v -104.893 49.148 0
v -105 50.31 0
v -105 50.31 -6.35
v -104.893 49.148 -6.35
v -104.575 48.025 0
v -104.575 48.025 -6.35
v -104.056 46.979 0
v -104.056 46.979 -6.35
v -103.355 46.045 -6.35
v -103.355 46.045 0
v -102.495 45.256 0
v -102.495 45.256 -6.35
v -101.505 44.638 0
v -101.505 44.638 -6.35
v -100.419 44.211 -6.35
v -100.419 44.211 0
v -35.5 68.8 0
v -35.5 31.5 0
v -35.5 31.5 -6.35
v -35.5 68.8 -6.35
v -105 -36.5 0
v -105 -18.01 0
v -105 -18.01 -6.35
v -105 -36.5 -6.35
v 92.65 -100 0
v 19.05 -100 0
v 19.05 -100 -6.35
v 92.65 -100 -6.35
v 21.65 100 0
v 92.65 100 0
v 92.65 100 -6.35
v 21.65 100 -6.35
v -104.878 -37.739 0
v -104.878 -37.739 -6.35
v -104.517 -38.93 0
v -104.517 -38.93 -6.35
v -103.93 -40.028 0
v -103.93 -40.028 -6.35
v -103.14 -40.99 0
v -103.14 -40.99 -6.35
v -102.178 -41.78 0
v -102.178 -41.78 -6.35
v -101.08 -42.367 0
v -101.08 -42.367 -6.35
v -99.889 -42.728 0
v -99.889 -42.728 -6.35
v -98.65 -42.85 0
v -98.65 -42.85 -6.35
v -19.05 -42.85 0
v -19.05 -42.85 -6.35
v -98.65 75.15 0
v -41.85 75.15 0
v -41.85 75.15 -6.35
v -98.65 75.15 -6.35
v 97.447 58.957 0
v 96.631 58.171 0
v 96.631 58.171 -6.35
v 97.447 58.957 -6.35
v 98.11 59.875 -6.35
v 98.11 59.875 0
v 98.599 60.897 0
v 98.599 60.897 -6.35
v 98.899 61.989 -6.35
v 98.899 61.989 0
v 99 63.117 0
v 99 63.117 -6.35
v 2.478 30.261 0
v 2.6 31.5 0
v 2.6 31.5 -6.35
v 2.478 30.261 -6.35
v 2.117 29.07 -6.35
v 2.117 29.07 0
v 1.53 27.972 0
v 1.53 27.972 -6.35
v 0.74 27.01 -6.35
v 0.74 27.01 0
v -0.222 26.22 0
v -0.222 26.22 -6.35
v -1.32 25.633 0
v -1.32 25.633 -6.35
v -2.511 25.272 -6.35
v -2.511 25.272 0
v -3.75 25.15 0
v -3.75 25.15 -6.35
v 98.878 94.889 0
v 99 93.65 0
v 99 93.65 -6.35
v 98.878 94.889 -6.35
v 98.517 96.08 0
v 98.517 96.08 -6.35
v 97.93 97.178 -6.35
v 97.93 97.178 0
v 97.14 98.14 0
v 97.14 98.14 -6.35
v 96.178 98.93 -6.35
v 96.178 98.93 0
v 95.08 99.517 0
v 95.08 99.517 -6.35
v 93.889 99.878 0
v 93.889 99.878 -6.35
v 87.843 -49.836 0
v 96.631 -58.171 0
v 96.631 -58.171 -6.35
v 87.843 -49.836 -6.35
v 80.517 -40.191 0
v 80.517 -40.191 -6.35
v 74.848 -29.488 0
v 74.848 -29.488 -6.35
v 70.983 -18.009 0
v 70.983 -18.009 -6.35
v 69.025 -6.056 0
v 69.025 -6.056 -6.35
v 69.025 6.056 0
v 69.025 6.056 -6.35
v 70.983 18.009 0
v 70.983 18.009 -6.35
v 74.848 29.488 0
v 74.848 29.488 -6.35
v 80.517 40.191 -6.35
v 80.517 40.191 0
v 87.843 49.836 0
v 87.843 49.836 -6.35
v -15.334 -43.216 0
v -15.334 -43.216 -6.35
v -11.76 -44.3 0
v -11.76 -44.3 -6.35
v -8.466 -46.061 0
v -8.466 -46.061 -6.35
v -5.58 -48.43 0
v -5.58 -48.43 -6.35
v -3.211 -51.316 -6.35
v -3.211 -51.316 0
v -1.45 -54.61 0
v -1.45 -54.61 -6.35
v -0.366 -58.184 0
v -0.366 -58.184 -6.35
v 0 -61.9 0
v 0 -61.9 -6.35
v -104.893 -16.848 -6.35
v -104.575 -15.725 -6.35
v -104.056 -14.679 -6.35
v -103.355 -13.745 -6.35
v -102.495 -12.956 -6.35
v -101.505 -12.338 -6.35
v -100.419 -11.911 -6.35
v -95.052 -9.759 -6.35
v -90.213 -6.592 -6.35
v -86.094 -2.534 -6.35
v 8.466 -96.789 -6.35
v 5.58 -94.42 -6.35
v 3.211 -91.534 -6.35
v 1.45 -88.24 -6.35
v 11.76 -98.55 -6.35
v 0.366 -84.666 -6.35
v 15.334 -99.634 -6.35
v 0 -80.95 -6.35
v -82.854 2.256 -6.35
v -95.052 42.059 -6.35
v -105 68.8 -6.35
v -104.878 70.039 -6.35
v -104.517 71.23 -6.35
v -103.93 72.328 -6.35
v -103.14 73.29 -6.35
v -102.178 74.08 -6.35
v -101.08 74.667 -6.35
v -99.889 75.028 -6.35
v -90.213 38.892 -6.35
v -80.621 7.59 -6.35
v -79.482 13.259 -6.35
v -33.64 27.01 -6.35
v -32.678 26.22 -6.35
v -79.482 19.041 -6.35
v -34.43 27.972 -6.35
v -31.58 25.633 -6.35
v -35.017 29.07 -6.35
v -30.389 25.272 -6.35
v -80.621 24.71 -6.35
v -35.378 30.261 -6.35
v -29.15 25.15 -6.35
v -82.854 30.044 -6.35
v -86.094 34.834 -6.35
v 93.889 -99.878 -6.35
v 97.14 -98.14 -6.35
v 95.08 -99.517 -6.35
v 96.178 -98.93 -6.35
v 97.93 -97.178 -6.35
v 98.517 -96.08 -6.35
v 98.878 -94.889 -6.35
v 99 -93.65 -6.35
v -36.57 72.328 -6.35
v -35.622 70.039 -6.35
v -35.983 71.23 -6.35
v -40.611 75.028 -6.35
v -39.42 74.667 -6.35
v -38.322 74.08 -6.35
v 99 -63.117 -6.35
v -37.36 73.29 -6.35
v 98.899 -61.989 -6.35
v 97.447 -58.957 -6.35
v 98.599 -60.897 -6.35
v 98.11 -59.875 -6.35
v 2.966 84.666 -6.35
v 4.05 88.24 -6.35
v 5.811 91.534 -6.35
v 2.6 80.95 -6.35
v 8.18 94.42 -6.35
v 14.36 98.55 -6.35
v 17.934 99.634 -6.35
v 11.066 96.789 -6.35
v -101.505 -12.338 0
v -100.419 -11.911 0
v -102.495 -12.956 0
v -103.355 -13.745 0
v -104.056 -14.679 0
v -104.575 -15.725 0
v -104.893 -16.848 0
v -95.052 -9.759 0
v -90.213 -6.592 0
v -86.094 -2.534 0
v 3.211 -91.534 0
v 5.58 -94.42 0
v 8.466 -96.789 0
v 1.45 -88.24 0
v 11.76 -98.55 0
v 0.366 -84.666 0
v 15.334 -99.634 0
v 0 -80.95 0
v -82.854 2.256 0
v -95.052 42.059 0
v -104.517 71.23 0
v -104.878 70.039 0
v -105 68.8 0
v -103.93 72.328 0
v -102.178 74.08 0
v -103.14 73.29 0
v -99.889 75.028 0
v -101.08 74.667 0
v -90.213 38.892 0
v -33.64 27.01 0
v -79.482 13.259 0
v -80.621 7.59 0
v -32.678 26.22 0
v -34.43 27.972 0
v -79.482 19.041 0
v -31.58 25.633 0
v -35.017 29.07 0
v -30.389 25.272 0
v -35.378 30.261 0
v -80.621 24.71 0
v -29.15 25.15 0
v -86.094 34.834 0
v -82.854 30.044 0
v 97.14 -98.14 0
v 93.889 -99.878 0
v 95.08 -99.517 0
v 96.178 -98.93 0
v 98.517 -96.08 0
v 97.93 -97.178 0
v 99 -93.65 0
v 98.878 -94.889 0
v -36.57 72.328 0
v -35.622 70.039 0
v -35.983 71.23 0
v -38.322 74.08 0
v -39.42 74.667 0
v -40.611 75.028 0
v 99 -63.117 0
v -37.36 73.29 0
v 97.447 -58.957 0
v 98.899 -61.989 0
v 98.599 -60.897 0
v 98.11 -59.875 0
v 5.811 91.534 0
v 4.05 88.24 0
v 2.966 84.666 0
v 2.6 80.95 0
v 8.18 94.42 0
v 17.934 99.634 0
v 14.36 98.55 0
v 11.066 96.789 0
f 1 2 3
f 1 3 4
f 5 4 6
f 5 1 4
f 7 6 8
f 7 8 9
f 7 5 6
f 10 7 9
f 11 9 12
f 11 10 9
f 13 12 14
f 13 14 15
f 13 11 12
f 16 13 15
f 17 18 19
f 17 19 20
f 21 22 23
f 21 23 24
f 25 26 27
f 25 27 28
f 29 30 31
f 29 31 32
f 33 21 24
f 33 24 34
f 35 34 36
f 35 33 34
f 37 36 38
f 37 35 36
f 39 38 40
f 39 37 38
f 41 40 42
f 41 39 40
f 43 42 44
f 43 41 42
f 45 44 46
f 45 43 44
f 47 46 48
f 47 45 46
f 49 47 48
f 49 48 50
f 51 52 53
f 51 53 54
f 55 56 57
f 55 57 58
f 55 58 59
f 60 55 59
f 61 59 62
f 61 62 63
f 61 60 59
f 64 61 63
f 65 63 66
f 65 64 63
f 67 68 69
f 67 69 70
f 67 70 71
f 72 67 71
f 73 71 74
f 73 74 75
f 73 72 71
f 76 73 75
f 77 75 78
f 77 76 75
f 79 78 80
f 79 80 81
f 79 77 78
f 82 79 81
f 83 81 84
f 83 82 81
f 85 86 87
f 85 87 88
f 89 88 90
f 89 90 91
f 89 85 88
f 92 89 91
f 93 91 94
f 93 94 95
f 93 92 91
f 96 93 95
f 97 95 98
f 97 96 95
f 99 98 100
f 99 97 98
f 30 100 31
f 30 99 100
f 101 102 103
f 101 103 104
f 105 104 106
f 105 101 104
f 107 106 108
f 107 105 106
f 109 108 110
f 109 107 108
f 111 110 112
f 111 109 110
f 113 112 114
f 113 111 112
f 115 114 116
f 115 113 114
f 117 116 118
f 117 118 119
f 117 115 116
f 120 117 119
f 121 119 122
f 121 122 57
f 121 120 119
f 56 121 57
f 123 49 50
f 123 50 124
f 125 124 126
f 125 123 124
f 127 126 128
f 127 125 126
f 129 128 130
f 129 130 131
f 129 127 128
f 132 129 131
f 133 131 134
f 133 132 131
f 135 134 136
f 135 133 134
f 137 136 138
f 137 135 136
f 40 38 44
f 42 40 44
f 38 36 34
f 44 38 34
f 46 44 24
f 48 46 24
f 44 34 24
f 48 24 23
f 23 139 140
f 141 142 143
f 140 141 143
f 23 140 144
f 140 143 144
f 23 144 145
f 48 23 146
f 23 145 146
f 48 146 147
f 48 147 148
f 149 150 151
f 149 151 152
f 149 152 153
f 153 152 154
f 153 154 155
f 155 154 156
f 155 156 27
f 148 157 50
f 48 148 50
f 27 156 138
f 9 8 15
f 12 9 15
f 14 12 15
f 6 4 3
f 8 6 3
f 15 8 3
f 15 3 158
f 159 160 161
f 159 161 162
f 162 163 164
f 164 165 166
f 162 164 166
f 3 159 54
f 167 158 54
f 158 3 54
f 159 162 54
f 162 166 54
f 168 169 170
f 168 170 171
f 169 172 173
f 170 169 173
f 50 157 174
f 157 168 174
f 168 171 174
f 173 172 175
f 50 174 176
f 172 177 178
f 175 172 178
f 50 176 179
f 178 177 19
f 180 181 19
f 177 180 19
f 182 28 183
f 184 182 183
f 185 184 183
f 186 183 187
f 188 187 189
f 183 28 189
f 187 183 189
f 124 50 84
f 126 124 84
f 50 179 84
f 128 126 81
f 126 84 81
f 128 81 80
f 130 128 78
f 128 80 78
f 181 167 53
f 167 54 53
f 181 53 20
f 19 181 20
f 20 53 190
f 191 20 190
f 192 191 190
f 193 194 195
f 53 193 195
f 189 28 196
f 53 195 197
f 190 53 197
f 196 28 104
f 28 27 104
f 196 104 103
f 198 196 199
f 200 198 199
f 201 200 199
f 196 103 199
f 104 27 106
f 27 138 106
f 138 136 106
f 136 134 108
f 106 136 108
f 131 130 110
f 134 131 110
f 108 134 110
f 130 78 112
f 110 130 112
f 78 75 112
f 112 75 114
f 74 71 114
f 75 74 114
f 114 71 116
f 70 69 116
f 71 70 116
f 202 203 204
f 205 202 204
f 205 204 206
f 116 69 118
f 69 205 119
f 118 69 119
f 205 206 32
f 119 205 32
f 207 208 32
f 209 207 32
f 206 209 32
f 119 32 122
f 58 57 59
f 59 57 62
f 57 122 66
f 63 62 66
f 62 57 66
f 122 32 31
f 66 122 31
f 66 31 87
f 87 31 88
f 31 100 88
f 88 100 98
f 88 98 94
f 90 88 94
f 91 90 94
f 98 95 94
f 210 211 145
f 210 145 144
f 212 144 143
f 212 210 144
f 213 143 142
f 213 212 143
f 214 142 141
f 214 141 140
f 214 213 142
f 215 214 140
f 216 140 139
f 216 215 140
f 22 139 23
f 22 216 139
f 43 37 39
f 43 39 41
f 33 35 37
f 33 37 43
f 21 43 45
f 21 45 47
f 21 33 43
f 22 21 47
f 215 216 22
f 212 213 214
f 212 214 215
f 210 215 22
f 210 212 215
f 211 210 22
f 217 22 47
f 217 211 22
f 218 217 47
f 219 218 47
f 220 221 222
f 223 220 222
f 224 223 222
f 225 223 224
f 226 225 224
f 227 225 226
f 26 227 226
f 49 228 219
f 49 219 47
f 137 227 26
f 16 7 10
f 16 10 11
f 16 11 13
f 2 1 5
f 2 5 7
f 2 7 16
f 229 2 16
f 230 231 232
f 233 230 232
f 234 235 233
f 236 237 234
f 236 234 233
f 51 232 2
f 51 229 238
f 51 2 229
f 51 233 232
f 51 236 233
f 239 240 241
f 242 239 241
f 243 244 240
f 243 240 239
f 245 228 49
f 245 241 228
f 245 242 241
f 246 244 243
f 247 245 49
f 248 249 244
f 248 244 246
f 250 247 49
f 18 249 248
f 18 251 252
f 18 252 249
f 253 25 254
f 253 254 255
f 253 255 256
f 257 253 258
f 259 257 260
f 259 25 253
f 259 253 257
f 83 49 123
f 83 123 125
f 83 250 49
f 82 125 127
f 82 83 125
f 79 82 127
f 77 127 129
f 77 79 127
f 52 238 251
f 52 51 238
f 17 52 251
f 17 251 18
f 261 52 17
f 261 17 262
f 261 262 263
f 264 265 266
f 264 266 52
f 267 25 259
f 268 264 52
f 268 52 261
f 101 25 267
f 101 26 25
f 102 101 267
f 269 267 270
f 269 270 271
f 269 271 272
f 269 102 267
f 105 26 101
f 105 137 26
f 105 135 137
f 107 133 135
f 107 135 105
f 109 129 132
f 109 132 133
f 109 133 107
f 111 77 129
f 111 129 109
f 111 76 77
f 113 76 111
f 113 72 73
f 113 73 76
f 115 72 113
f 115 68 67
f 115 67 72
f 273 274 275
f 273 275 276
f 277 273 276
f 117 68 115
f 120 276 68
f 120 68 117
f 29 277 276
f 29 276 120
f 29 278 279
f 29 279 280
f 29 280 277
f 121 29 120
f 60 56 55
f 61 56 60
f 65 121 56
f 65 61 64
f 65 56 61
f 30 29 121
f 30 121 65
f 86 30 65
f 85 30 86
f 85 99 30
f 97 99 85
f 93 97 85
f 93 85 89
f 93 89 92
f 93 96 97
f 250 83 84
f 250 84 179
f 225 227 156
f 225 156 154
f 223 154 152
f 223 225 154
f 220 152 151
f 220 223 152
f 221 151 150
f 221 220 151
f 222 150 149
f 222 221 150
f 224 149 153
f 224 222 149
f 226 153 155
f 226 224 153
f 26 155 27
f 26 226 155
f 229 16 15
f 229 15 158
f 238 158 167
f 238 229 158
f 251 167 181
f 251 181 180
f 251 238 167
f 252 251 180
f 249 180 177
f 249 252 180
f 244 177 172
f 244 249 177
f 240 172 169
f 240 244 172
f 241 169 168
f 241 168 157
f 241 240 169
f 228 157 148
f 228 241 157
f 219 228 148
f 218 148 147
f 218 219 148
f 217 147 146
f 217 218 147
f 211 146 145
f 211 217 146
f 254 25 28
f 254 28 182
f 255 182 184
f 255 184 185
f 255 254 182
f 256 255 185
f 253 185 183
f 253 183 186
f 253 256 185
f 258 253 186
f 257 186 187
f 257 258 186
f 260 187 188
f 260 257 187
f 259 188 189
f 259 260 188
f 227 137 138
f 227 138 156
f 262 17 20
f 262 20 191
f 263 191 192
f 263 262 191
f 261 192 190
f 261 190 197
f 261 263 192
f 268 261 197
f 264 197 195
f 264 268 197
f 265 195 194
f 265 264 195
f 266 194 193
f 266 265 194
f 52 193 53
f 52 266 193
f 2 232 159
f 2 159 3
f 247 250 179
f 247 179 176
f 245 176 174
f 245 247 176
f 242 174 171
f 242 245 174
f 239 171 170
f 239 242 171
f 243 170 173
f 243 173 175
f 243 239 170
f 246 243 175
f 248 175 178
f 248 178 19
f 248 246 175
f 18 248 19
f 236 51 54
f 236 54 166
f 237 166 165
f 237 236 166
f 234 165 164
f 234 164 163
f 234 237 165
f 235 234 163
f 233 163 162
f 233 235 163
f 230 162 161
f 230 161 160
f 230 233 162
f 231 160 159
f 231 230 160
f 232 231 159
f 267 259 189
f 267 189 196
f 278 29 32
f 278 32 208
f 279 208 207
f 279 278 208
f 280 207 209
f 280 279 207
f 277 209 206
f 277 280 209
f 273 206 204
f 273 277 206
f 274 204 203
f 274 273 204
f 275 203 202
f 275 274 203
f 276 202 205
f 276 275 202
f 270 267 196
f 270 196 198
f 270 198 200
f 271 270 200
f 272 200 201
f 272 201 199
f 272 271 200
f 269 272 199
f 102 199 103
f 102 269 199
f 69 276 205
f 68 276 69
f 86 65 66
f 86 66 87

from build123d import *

# Parameters (mm, degrees)
F1_DEPTH = 6.35


with BuildPart() as f1:
    # F0 (on Top) → F1 (new body)
    with BuildSketch(Plane.XY):
        with BuildLine():
            ThreePointArc((-105, -36.5), (-103.140128, -40.990128), (-98.65, -42.85))
            Line((-98.65, -42.85), (-19.05, -42.85))
            ThreePointArc((-19.05, -42.85), (-5.579616, -48.429616), (0, -61.9))
            Line((0, -61.9), (0, -80.95))
            ThreePointArc((0, -80.95), (5.579616, -94.420384), (19.05, -100))
            Line((19.05, -100), (92.65, -100))
            ThreePointArc((92.65, -100), (97.140128, -98.140128), (99, -93.65))
            Line((99, -93.65), (99, -63.117434))
            ThreePointArc((99, -63.117434), (98.377326, -60.375129), (96.631422, -58.170639))
            ThreePointArc((96.631422, -58.170639), (68.778704, 0), (96.631422, 58.170639))
            ThreePointArc((96.631422, 58.170639), (98.377326, 60.375129), (99, 63.117434))
            Line((99, 63.117434), (99, 93.65))
            ThreePointArc((99, 93.65), (97.140128, 98.140128), (92.65, 100))
            Line((92.65, 100), (21.65, 100))
            ThreePointArc((21.65, 100), (8.179616, 94.420384), (2.6, 80.95))
            Line((2.6, 80.95), (2.6, 75.15))
            Line((2.6, 75.15), (2.6, 31.5))
            ThreePointArc((2.6, 31.5), (0.740128, 27.009872), (-3.75, 25.15))
            Line((-3.75, 25.15), (-29.15, 25.15))
            ThreePointArc((-29.15, 25.15), (-33.640128, 27.009872), (-35.5, 31.5))
            Line((-35.5, 31.5), (-35.5, 68.8))
            ThreePointArc((-35.5, 68.8), (-37.359872, 73.290128), (-41.85, 75.15))
            Line((-41.85, 75.15), (-98.65, 75.15))
            ThreePointArc((-98.65, 75.15), (-103.140128, 73.290128), (-105, 68.8))
            Line((-105, 68.8), (-105, 50.309879))
            ThreePointArc((-105, 50.309879), (-103.727052, 46.495952), (-100.41857, 44.211136))
            ThreePointArc((-100.41857, 44.211136), (-79.338794, 16.15), (-100.41857, -11.911136))
            ThreePointArc((-100.41857, -11.911136), (-103.727052, -14.195952), (-105, -18.009879))
            Line((-105, -18.009879), (-105, -36.5))
        make_face()
    extrude(amount=-F1_DEPTH)


solid = f1.part
